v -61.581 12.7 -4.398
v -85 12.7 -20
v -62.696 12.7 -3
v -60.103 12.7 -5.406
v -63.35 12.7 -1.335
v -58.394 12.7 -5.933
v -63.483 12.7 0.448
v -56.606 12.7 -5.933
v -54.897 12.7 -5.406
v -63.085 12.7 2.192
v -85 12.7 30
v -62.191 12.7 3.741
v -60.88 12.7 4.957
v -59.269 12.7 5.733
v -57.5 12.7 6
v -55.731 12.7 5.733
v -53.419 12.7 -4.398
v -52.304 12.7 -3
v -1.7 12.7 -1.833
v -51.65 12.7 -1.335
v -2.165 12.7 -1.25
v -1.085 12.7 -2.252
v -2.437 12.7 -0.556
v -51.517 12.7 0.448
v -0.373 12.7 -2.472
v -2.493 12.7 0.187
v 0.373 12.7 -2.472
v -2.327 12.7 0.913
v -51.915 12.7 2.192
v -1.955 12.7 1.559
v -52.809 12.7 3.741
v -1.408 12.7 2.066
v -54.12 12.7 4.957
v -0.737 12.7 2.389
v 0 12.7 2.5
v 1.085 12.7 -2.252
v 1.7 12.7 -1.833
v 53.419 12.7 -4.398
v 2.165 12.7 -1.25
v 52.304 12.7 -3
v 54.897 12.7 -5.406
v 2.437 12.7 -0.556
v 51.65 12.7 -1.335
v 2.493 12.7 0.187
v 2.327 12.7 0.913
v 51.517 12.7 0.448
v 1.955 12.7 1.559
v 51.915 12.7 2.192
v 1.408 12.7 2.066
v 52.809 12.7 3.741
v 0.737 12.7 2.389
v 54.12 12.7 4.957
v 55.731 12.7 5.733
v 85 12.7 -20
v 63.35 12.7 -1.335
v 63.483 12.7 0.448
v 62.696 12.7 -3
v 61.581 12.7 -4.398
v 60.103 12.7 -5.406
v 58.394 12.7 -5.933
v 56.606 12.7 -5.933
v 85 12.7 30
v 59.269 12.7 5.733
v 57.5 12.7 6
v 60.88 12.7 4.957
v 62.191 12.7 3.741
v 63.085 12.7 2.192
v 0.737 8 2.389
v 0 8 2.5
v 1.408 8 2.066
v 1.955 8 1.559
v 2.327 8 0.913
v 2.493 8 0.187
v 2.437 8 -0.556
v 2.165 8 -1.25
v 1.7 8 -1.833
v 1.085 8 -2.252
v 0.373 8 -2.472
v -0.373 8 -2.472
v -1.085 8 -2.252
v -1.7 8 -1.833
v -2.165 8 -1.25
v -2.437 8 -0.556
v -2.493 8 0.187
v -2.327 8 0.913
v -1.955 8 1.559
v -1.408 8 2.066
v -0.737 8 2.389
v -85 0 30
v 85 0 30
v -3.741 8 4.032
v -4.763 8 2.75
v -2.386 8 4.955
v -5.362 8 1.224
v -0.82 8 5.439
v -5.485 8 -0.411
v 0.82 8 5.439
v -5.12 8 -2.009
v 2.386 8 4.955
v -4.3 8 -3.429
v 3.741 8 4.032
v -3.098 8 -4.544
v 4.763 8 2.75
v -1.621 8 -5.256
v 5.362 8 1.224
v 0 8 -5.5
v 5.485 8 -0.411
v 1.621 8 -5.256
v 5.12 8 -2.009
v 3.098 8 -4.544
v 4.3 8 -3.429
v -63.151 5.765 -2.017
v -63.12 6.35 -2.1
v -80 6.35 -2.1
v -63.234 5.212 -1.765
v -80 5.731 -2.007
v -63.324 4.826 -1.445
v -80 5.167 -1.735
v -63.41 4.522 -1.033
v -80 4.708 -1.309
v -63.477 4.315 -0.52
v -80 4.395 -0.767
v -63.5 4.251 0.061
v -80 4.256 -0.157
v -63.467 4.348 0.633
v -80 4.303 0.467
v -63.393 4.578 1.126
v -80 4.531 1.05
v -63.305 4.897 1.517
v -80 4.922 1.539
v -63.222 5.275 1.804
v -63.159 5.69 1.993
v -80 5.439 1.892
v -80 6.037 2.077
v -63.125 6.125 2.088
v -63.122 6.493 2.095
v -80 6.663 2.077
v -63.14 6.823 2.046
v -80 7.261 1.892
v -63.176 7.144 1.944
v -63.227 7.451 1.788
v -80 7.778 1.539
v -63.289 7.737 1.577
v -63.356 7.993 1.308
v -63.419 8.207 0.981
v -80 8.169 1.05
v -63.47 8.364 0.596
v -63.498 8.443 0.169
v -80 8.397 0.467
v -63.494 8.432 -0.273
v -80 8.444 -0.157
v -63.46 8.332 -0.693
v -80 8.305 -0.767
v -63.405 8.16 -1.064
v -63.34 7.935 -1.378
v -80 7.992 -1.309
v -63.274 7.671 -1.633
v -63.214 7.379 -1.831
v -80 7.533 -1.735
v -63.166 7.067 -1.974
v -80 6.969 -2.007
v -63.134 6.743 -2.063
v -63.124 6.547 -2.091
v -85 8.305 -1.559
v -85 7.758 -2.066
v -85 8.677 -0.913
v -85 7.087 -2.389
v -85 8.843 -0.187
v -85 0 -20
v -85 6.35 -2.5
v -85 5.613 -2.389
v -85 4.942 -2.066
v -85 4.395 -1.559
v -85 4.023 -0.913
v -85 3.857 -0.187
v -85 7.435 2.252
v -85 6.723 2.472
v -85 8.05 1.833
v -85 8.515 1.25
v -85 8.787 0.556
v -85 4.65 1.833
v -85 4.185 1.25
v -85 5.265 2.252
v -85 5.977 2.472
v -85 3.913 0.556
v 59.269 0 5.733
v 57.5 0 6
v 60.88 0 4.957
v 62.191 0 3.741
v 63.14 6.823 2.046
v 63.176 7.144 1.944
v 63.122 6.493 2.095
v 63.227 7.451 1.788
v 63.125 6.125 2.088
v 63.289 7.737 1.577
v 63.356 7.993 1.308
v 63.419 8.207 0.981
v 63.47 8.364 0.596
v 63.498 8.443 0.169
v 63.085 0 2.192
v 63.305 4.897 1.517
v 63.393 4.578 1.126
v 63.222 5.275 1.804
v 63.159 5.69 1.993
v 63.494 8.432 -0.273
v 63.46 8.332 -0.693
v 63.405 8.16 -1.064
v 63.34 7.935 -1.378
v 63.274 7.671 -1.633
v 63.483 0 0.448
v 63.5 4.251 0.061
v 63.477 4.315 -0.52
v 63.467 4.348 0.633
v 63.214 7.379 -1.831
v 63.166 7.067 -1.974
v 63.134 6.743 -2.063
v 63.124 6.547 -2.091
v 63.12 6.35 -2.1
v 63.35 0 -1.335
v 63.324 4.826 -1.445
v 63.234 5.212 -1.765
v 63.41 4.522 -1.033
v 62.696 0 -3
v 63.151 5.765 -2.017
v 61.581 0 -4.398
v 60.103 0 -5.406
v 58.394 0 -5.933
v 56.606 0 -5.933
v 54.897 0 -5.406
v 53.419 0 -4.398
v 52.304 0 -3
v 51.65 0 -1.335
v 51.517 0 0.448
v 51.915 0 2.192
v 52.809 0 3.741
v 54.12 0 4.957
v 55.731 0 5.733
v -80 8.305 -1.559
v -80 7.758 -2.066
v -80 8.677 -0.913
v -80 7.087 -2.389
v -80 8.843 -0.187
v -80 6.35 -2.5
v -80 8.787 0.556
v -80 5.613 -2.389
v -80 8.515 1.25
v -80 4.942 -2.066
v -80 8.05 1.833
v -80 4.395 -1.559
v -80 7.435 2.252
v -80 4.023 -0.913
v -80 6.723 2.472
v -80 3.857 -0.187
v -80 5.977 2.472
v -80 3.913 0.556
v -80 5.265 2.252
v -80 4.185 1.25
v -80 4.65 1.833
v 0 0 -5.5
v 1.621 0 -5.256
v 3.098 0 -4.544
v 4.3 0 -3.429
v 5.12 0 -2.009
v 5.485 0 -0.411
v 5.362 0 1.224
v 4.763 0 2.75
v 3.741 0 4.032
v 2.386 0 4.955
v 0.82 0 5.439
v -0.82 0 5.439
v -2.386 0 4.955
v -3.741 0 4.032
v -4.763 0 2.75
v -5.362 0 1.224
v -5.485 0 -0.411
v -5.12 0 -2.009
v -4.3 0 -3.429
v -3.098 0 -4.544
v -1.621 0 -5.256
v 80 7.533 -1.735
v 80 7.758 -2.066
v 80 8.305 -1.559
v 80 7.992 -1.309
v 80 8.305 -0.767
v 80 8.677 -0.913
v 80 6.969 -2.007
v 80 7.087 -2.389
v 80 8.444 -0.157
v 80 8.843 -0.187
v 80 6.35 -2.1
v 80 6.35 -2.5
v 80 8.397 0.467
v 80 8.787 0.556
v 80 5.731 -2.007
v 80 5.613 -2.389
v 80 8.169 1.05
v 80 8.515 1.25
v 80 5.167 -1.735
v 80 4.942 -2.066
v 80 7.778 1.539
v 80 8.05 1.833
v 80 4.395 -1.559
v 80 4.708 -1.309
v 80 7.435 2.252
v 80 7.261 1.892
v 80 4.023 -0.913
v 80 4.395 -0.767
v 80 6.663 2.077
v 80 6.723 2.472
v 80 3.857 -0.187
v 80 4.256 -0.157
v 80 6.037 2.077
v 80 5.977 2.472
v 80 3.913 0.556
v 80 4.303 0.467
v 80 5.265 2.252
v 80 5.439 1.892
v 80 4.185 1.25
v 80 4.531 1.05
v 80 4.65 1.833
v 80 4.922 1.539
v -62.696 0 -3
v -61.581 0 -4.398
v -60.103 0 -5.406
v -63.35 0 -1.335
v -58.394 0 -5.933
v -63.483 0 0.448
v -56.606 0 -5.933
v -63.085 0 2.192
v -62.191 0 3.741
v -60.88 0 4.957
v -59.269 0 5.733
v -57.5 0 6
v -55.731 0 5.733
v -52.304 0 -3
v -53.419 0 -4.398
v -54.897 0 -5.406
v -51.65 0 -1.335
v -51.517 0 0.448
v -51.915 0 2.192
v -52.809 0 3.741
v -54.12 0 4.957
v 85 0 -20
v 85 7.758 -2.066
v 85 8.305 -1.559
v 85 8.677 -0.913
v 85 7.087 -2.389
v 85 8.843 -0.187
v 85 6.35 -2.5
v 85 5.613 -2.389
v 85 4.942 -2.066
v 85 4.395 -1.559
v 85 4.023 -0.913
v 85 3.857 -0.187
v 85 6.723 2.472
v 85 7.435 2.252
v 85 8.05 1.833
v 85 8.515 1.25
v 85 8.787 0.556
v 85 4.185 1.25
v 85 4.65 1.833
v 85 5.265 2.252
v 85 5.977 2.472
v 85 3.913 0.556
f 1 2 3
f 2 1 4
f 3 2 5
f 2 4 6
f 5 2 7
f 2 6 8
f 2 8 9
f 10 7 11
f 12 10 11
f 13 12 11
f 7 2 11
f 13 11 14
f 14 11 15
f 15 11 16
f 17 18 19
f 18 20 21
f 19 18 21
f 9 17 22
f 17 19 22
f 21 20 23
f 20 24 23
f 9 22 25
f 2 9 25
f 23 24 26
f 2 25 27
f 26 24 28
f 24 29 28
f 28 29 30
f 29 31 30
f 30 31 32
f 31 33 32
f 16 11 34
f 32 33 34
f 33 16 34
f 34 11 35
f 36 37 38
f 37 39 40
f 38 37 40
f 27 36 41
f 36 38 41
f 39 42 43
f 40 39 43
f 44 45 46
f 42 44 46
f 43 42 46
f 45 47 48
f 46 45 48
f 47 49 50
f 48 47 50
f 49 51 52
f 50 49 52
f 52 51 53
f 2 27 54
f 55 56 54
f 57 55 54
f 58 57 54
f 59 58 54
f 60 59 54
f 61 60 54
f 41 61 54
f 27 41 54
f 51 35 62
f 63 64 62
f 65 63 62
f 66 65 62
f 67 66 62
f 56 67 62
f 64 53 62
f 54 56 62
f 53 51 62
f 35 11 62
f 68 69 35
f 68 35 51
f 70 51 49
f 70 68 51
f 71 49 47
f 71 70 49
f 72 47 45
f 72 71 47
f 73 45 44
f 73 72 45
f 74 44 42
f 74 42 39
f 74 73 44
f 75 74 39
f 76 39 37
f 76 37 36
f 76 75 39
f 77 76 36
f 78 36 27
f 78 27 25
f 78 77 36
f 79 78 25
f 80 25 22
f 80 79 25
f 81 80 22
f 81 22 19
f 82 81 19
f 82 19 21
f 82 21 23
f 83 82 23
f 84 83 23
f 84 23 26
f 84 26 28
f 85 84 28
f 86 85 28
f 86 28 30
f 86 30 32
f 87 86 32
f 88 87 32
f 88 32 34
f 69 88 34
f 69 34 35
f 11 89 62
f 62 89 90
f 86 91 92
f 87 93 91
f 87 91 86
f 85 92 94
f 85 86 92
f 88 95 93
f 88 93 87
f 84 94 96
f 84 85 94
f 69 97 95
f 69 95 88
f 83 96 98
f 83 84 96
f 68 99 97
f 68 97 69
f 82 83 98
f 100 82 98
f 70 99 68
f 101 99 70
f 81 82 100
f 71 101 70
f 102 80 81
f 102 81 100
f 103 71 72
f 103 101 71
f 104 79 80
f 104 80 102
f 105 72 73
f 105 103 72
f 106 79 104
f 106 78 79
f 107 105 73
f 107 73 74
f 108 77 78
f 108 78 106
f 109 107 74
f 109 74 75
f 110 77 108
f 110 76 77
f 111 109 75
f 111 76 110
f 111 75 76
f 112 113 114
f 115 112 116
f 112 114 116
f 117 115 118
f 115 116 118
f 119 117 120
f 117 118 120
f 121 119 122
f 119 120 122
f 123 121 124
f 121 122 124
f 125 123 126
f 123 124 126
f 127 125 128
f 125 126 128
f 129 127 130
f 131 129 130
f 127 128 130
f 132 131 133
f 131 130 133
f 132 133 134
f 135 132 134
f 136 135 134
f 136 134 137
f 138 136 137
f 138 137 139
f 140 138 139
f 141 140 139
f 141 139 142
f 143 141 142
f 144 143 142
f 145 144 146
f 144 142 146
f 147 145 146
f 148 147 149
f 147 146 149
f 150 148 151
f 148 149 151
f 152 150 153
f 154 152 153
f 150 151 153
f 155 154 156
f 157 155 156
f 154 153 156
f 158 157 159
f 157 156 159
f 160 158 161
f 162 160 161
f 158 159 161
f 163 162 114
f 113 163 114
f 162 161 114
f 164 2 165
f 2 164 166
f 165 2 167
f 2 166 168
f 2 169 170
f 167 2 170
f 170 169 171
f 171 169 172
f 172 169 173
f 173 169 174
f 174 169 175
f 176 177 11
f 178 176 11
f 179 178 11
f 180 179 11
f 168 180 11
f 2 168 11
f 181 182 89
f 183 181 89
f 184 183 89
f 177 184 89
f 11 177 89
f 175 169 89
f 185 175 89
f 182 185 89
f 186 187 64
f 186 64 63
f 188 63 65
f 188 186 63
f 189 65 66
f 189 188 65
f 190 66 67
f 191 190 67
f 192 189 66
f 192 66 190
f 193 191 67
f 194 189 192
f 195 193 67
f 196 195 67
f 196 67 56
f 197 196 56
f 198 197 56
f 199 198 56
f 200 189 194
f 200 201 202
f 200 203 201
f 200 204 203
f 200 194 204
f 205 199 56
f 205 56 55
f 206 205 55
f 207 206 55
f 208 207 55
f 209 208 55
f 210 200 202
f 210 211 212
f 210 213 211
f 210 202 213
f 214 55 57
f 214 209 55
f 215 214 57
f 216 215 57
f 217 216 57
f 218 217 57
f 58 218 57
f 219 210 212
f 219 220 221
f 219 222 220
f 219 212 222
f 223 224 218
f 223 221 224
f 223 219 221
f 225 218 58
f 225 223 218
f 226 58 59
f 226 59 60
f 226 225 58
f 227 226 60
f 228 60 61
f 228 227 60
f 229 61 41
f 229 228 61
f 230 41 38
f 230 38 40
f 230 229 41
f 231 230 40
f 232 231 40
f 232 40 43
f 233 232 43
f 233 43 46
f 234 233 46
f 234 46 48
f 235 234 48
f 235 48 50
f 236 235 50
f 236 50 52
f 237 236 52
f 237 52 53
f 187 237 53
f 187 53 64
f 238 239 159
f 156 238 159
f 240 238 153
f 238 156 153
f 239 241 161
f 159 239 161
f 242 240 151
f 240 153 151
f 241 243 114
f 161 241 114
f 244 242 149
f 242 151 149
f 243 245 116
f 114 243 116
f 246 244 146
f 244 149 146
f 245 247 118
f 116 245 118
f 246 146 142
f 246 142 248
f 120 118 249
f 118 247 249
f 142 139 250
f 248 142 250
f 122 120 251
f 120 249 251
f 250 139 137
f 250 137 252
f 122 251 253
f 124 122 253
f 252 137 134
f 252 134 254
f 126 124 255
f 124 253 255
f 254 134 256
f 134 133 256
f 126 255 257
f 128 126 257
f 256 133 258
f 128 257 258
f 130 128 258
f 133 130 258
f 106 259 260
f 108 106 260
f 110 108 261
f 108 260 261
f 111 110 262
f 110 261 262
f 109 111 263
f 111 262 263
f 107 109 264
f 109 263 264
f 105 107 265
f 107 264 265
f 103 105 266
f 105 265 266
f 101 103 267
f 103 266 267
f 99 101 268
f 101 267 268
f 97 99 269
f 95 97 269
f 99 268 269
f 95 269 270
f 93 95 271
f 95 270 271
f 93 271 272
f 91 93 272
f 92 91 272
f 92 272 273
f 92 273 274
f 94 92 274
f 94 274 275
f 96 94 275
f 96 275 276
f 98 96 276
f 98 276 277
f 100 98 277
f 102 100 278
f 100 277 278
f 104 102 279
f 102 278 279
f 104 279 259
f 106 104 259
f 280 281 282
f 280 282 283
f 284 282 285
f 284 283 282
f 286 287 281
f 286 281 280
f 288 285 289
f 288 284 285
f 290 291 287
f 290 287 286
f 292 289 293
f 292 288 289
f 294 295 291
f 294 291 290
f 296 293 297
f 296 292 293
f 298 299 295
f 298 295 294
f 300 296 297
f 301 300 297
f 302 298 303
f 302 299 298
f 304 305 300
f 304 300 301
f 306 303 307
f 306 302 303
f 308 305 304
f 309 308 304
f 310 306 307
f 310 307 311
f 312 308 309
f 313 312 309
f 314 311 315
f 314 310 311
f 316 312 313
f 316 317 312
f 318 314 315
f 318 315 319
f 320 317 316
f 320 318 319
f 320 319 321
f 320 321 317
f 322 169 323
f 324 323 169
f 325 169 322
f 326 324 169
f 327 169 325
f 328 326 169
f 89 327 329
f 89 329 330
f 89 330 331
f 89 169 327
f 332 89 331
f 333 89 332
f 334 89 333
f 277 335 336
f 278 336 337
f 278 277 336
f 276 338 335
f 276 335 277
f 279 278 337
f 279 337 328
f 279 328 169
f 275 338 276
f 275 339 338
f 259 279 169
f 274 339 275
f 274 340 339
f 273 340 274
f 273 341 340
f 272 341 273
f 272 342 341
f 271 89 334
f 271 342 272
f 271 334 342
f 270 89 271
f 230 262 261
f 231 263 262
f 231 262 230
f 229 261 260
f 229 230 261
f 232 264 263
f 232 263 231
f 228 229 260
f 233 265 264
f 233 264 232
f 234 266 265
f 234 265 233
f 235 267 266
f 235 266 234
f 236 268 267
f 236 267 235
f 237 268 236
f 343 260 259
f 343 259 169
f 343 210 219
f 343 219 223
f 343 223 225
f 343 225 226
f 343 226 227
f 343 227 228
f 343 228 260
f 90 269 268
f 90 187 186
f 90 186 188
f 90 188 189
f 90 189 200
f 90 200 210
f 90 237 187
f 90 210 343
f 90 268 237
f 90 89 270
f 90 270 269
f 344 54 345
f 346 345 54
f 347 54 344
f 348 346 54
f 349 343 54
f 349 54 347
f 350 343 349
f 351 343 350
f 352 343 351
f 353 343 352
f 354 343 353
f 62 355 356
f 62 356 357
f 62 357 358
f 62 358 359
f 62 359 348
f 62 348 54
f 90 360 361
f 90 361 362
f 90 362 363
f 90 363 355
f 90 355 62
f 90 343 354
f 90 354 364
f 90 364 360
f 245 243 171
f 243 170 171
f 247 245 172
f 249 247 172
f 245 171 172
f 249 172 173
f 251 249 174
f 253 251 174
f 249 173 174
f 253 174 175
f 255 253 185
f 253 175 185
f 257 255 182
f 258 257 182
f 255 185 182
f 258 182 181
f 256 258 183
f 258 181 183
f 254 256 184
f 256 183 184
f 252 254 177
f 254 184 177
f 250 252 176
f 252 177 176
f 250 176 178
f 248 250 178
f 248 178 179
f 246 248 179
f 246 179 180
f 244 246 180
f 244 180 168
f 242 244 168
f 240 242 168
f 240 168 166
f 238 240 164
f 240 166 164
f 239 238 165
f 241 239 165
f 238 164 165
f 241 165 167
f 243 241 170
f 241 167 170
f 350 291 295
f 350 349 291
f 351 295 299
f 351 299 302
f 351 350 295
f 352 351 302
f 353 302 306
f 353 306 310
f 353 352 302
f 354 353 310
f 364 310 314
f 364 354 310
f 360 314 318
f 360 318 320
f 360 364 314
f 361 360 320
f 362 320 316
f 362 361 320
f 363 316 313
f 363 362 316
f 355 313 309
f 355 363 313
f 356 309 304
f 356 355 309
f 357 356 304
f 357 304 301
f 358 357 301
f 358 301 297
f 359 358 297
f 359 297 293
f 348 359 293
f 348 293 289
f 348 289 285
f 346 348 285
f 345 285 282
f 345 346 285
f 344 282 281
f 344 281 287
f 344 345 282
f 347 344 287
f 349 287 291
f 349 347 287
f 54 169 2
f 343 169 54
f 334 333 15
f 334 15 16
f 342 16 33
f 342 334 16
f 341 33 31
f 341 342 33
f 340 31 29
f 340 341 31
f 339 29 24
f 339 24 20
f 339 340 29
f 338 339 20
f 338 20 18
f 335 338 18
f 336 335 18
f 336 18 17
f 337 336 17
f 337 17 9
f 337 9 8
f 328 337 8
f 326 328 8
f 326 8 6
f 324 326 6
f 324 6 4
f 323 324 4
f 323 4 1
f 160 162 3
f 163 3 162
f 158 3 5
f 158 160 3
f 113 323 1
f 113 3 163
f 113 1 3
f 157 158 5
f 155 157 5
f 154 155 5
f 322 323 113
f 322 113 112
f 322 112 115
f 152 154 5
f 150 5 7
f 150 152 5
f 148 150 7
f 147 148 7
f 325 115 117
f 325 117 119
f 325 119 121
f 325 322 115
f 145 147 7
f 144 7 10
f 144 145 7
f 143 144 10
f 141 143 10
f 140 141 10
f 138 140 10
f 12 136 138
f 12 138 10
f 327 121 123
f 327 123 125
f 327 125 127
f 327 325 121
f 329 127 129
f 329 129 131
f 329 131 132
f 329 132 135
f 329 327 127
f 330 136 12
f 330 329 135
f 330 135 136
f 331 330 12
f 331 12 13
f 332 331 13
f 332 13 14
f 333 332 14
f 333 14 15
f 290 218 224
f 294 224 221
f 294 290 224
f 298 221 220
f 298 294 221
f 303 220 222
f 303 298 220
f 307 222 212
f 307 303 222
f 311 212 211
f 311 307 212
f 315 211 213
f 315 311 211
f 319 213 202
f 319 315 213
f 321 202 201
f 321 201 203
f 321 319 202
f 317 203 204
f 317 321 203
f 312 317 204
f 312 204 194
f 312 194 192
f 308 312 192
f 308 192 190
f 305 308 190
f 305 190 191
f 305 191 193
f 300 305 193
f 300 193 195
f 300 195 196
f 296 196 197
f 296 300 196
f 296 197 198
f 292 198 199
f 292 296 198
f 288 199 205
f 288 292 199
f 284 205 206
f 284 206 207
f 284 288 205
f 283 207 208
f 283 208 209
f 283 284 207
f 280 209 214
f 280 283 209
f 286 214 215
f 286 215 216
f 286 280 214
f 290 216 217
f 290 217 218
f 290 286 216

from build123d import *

# Parameters (mm, degrees)
ESBO_O1_W                = 150
ESBO_O1_H                = 40
ESBO_O1_R                = 2.5
ESBO_O1_R_2              = 6
RESSALTO_EXTRUS_O1_DEPTH = 12.7
ESBO_O4_R                = 5.5
CORTE_EXTRUS_O1_DEPTH    = 8
ESBO_O7_W                = 150
ESBO_O7_H                = 10
RESSALTO_EXTRUS_O4_DEPTH = 12.7
ESBO_O8_W                = 10
ESBO_O8_H                = 50
RESSALTO_EXTRUS_O5_DEPTH = 12.7
ESBO_O9_R                = 2
CORTE_EXTRUS_O2_DEPTH    = 10


with BuildPart() as part:
    # Esboço1 → Ressalto-extrusão1 (new body)
    with BuildSketch(Plane(origin=(0, 0, 0), x_dir=(1, 0, 0), z_dir=(0, 1, 0))):
        Rectangle(ESBO_O1_W, ESBO_O1_H)
        with Locations(Location((0, 0, 0), (0, 0, 270))):
            Circle(ESBO_O1_R, mode=Mode.SUBTRACT)
        with Locations(Location((-57.5, 0, 0), (0, 0, 270))):
            Circle(ESBO_O1_R_2, mode=Mode.SUBTRACT)
        with Locations(Location((57.5, 0, 0), (0, 0, 270))):
            Circle(ESBO_O1_R_2, mode=Mode.SUBTRACT)
    extrude(amount=RESSALTO_EXTRUS_O1_DEPTH)

    # Esboço4 → Corte-extrusão1 (cut)
    with BuildSketch(Plane.XZ):
        with Locations(Location((0, 0, 0), (0, 0, 270))):
            Circle(ESBO_O4_R)
    extrude(amount=-CORTE_EXTRUS_O1_DEPTH, mode=Mode.SUBTRACT)

    # Esboço7 → Ressalto-extrusão4 (add)
    with BuildSketch(Plane.XZ):
        with Locations((0, 25)):
            Rectangle(ESBO_O7_W, ESBO_O7_H)
    extrude(amount=-RESSALTO_EXTRUS_O4_DEPTH)

    # Esboço8 → Ressalto-extrusão5 (add)
    with BuildSketch(Plane.XZ):
        with Locations((-80, 5)):
            Rectangle(ESBO_O8_W, ESBO_O8_H)
        with Locations((80, 5)):
            Rectangle(ESBO_O8_W, ESBO_O8_H)
    extrude(amount=-RESSALTO_EXTRUS_O5_DEPTH)

    # Esboço9 → Corte-extrusão2 (cut)
    with BuildSketch(Plane(origin=(85, 0, 0), x_dir=(0, 0, -1), z_dir=(1, 0, 0))):
        with Locations((0, 6.35)):
            Circle(ESBO_O9_R)
    corte_extrus_o2 = extrude(amount=-CORTE_EXTRUS_O2_DEPTH, mode=Mode.SUBTRACT)

    # Esboço13 → Furo roscado de M52 (revolve, cut)
    with BuildSketch(Plane(origin=(85, 6.35, 0), x_dir=(0, 0, -1), z_dir=(0, 1, 0))):
        Polygon((0, 0), (0, 30.2618073), (2.1, 29), (2.1, 5), (2.5, 5), (2.5, 0), align=None)
    furo_roscado_de_m52 = revolve(axis=Axis((91.35, 6.35, 0), (-1, 0, 0)), mode=Mode.SUBTRACT)

    # Espelhar1: Corte-extrusão2, Furo roscado de M52 across plane
    add(corte_extrus_o2.mirror(Plane(origin=(0, 0, 0), x_dir=(0, 0, 1), z_dir=(1, 0, 0))), mode=Mode.SUBTRACT)
    add(furo_roscado_de_m52.mirror(Plane(origin=(0, 0, 0), x_dir=(0, 0, 1), z_dir=(1, 0, 0))), mode=Mode.SUBTRACT)


solid = part.part
